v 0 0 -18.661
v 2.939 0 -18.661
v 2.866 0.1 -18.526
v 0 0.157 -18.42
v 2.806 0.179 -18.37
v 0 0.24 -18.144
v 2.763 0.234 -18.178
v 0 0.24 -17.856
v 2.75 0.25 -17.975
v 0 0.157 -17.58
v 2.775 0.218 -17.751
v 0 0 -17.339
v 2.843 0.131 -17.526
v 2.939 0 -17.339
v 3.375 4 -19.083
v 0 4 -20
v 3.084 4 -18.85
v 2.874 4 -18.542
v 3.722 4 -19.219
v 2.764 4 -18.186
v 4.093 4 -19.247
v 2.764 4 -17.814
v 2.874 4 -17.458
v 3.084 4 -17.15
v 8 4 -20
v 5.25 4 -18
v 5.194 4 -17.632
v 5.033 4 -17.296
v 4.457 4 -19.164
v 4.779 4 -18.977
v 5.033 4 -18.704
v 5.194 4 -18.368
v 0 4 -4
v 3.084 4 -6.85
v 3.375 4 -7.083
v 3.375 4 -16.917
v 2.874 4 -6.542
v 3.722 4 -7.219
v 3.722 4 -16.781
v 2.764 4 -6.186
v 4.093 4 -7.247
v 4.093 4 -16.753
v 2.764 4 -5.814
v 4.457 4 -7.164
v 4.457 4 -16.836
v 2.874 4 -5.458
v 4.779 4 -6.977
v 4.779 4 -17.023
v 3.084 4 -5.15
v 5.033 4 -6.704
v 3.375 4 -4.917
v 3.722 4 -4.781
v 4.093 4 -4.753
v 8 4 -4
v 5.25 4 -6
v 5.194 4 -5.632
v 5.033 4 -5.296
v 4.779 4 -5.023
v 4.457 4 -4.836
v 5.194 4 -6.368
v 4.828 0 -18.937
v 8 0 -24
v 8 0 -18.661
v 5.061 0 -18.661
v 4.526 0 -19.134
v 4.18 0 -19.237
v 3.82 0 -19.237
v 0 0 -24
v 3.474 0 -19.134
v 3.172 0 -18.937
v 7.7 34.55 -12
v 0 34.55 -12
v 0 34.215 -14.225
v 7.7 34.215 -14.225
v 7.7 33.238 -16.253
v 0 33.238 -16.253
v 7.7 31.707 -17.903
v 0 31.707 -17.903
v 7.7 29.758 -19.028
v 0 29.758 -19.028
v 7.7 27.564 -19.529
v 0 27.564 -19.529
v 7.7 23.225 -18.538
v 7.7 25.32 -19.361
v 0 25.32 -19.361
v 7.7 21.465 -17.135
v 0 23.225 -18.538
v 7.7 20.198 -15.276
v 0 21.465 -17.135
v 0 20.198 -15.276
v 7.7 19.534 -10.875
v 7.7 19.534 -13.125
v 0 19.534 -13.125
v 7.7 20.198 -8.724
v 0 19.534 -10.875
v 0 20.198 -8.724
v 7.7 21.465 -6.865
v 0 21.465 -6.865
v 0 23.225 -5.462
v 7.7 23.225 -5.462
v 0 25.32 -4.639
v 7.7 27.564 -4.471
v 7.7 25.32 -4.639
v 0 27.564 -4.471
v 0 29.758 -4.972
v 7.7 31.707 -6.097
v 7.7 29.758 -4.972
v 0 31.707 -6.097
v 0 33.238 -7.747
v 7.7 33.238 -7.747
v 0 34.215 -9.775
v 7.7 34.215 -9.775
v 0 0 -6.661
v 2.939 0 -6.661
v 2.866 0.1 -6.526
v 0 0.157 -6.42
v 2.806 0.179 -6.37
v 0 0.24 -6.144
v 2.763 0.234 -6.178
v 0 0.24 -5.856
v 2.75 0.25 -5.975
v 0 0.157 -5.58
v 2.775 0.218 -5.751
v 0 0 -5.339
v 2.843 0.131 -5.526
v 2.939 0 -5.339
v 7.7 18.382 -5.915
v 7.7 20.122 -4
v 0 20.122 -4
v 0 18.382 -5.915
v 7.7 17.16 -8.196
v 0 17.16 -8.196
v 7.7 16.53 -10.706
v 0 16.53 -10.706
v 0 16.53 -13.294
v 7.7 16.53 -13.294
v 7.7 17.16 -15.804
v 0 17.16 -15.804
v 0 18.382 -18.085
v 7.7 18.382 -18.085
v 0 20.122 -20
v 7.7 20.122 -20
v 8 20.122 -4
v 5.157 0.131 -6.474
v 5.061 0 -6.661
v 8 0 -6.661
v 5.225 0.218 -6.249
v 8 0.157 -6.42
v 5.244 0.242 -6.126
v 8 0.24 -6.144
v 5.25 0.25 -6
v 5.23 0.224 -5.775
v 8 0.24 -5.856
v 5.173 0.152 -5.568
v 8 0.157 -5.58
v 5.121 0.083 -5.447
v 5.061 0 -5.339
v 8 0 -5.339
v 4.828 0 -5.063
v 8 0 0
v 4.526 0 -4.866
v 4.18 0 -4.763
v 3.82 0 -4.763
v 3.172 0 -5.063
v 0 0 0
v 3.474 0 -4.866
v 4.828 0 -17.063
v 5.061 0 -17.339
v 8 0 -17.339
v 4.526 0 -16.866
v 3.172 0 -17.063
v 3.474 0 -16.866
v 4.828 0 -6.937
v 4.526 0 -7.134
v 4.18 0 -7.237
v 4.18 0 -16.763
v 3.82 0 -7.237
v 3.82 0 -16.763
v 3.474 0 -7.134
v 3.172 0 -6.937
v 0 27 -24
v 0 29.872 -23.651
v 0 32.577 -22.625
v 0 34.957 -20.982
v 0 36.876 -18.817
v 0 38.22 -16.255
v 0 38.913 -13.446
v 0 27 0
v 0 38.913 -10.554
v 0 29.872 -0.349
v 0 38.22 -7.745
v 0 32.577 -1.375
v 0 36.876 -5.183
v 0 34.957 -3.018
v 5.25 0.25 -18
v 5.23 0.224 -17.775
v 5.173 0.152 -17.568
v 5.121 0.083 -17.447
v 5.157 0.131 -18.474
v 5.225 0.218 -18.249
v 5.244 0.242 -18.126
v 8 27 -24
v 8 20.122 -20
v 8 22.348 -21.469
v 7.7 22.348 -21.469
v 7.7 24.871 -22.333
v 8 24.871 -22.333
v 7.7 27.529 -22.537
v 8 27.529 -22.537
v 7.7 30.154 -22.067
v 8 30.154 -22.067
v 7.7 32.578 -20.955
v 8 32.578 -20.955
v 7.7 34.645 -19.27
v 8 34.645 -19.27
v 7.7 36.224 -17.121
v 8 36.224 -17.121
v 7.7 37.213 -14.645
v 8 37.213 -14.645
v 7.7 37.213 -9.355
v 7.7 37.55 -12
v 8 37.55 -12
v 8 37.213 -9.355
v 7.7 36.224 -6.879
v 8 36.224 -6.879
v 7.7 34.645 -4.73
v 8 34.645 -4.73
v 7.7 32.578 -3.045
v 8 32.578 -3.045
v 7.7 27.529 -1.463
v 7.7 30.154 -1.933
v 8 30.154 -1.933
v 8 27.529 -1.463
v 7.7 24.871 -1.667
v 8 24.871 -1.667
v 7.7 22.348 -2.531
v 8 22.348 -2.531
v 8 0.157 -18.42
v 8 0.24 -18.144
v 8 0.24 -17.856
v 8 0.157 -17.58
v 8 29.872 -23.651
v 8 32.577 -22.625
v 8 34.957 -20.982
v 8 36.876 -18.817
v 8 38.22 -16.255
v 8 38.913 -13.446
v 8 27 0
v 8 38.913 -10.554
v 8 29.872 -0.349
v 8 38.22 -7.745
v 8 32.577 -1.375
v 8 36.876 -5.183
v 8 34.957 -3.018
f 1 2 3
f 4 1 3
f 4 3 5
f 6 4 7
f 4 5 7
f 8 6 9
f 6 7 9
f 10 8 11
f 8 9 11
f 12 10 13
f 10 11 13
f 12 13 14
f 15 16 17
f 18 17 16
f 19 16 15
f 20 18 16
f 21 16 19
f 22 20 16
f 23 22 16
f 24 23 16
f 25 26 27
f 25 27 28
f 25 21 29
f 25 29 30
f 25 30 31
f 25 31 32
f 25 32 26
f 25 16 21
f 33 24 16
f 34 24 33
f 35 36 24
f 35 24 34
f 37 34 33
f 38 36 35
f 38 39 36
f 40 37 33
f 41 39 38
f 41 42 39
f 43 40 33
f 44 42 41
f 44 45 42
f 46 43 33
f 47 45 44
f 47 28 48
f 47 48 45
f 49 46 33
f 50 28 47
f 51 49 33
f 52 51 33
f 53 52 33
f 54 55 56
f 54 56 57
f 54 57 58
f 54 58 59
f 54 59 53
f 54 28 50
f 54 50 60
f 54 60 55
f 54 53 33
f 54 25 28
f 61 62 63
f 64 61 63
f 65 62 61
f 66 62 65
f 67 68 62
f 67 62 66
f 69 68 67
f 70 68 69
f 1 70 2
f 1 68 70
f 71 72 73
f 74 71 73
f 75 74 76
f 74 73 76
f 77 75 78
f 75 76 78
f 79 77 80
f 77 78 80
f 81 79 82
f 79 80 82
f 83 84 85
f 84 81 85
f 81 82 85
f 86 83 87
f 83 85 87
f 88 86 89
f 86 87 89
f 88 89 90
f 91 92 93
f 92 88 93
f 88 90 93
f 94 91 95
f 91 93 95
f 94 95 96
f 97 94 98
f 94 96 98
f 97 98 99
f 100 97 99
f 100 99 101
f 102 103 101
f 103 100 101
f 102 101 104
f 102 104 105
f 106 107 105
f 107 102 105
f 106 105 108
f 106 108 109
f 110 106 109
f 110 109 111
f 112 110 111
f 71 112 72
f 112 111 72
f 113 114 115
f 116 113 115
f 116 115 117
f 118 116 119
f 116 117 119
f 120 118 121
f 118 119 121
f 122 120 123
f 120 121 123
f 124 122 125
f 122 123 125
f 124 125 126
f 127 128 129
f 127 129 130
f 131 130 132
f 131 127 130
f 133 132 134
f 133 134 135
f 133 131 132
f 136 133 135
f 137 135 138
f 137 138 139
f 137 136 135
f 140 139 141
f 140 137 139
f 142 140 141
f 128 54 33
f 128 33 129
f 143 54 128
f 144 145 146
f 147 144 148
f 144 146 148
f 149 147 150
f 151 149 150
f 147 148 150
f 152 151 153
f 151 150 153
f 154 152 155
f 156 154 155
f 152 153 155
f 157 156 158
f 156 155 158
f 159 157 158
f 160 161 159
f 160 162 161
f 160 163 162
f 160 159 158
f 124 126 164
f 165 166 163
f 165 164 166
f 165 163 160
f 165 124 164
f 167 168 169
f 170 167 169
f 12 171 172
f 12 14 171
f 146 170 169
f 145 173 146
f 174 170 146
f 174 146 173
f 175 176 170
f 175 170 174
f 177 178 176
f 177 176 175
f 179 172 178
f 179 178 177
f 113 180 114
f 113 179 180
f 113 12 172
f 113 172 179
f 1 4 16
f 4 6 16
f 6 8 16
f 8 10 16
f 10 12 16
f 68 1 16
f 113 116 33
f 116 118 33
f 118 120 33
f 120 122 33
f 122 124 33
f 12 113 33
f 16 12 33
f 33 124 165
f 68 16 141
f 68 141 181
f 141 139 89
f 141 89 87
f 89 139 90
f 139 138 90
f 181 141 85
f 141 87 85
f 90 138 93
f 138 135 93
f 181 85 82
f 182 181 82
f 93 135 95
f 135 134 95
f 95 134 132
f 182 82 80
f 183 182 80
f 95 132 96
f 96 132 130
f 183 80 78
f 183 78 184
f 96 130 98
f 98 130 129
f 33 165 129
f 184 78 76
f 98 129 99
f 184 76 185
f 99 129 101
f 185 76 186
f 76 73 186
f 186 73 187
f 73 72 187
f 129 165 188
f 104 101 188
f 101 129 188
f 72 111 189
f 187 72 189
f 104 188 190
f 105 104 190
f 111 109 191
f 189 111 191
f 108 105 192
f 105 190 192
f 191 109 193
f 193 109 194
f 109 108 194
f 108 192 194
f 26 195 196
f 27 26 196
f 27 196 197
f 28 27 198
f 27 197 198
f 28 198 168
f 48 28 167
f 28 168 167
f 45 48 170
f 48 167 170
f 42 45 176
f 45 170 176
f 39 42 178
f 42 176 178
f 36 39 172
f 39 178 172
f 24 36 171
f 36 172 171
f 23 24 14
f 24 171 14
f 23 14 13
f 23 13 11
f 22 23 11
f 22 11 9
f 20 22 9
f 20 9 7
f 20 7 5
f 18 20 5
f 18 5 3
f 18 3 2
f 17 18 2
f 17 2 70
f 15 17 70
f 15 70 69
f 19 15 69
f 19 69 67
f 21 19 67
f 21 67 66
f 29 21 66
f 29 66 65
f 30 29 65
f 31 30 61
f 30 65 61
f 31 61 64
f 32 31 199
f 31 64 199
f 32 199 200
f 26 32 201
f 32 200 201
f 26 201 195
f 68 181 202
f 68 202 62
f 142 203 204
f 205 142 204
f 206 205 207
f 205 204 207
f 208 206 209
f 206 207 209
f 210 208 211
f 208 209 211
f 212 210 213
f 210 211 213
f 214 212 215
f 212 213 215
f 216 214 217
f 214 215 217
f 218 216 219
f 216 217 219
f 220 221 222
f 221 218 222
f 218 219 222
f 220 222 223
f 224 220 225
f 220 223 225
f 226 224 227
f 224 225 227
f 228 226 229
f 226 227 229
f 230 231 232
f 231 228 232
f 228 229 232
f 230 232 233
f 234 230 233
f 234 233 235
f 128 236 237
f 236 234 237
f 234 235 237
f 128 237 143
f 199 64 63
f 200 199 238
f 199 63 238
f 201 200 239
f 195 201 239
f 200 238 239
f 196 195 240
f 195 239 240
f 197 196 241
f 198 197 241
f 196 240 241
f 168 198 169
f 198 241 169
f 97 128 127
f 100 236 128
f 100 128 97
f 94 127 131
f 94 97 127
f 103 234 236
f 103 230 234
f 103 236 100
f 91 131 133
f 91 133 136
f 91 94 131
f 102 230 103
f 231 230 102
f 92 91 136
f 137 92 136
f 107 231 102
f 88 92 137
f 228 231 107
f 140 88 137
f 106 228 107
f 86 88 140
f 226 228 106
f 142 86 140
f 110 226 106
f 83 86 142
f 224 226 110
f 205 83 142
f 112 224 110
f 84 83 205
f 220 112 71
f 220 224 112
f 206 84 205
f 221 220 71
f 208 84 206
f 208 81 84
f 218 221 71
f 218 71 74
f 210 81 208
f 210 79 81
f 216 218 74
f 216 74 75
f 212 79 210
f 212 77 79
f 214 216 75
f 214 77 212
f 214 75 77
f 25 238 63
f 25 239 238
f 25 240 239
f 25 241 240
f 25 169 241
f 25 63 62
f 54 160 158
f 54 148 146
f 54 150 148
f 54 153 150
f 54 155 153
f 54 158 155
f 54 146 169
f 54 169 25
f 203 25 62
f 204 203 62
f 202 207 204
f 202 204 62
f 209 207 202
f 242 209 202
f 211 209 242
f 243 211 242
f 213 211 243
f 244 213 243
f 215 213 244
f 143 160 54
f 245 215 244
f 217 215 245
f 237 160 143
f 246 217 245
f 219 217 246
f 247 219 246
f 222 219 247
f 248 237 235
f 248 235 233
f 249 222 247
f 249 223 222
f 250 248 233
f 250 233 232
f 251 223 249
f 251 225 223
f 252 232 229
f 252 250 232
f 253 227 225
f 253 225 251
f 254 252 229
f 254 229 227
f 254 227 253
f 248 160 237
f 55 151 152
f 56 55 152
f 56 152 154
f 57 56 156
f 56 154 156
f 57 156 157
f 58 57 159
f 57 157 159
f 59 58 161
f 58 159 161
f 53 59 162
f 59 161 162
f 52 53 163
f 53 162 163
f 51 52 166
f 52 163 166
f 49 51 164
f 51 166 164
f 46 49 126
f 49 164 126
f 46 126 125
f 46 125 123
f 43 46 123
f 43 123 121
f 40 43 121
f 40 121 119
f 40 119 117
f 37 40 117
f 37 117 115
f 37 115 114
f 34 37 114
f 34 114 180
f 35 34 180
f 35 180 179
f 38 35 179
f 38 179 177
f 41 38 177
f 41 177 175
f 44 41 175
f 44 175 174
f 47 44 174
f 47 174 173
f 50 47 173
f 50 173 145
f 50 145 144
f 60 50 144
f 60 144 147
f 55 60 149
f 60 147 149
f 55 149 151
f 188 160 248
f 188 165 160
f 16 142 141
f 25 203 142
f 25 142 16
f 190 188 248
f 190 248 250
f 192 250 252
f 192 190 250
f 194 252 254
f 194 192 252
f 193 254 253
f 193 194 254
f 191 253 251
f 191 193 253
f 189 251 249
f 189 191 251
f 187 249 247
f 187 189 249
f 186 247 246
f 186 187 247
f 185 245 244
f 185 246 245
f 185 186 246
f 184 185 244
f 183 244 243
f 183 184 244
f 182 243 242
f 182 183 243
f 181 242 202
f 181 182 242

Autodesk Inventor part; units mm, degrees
ref_plane "YZ Plane" through (0, 0, 0) normal (1, 0, 0) x (0, 1, 0)
ref_plane "XZ Plane" through (0, 0, 0) normal (0, 1, 0) x (-1, 0, 0)
ref_plane "XY Plane" through (0, 0, 0) normal (0, 0, 1) x (1, 0, 0)
sketch "스케치1" plane through (0, 0, 0) normal (1, 0, 0) x (0, 1, 0)
  line L0 (0, 0) -> (27, 0)
  line L1 (27, -24) -> (0, -24)
  line L2 (0, -24) -> (0, 0)
  circle A0 centre (27, -12) radius 7.55
  arc A1 (27, -24) -> (27, 0) centre (27, -12) ccw
  dimension "d2" = 15.1
  dimension "d3" = 12
  dimension "d4" = 27
  dimension "d8" = 24
extrude "돌출2" add sketch "스케치1" along normal blind 8
sketch "스케치2" plane through (8, 0, 0) normal (1, 0, 0) x (0, 0, -1)
  circle A0 centre (12, 27) radius 7.55 projected
  line L0 (0, 27) -> (0, 0) projected
  line L1 (0, 0) -> (24, 0) projected
  line L2 (24, 0) -> (24, 27) projected
  arc A1 (24, 27) -> (0, 27) centre (12, 27) ccw projected
  arc A2 (4, 20.1223) -> (20, 20.1223) centre (12, 27) ccw
  line L3 (4, 4) -> (4, 20.1223)
  line L4 (20, 20.1223) -> (20, 4)
  line L5 (20, 4) -> (4, 4)
  dimension "d12" = 3
  dimension "d13" = 4
extrude "돌출3" cut sketch "스케치2" against normal blind 8 contours A2 L4 L5 L3
sketch "스케치3" plane through (0, 0, -24) normal (0, -1, 0) x (1, 0, 0)
  circle A0 centre (4, 18) radius 1.25
  circle A1 centre (4, 6) radius 1.25
  line L0 (8, 24) -> (8, 0) projected
  line L1 (0, 24) -> (8, 24) projected
  line L2 (0, 0) -> (8, 0) projected
  dimension "d16" = 2.5
  dimension "d17" = 2.5
  dimension "d18" = 4
  dimension "d19" = 4
  dimension "d20" = 6
  dimension "d21" = 6
extrude "돌출4" cut sketch "스케치3" against normal blind 8
sketch "스케치4" plane through (8, 0, 0) normal (1, 0, 0) x (0, 0, -1)
  line L0 (4.75, 4) -> (7.25, 4) projected
  line L1 (7.25, 0) -> (4.75, 0) projected
  line L2 (16.75, 4) -> (19.25, 4) projected
  line L3 (19.25, 0) -> (16.75, 0) projected
  arc A0 (6.6614, 0) -> (5.3386, 0) centre (6, -0.75) ccw
  arc A1 (18.6614, 0) -> (17.3386, 0) centre (18, -0.75) ccw
  line L4 (0, 0) -> (24, 0) projected
  dimension "d24" = 2
  dimension "d25" = 2
extrude "돌출5" cut sketch "스케치4" against normal blind 8
sketch "스케치5" plane through (8, 0, 0) normal (1, 0, 0) x (0, 0, -1)
  arc A0 (6.6614, 0) -> (5.3386, 0) centre (6, -0.75) ccw projected
  line L0 (6.6614, 0) -> (17.3386, 0) projected
  arc A1 (18.6614, 0) -> (17.3386, 0) centre (18, -0.75) ccw projected
  line L1 (18.6614, 0) -> (24, 0) projected
  line L2 (24, 0) -> (24, 27) projected
  arc A2 (24, 27) -> (0, 27) centre (12, 27) ccw projected
  line L3 (0, 27) -> (0, 0) projected
  line L4 (0, 0) -> (5.3386, 0) projected
  circle A3 centre (12, 27) radius 7.55 projected
  line L5 (20, 4) -> (4, 4) projected
  line L6 (4, 4) -> (4, 20.1223) projected
  arc A4 (4, 20.1223) -> (20, 20.1223) centre (12, 27) ccw projected
  line L7 (20, 20.1223) -> (20, 4) projected
  circle A5 centre (12, 27) radius 10.55
extrude "돌출6" cut sketch "스케치5" against normal blind 0.3 contours A4 A5
properties part number "베어링받침대" material "알루미늄 6061"
